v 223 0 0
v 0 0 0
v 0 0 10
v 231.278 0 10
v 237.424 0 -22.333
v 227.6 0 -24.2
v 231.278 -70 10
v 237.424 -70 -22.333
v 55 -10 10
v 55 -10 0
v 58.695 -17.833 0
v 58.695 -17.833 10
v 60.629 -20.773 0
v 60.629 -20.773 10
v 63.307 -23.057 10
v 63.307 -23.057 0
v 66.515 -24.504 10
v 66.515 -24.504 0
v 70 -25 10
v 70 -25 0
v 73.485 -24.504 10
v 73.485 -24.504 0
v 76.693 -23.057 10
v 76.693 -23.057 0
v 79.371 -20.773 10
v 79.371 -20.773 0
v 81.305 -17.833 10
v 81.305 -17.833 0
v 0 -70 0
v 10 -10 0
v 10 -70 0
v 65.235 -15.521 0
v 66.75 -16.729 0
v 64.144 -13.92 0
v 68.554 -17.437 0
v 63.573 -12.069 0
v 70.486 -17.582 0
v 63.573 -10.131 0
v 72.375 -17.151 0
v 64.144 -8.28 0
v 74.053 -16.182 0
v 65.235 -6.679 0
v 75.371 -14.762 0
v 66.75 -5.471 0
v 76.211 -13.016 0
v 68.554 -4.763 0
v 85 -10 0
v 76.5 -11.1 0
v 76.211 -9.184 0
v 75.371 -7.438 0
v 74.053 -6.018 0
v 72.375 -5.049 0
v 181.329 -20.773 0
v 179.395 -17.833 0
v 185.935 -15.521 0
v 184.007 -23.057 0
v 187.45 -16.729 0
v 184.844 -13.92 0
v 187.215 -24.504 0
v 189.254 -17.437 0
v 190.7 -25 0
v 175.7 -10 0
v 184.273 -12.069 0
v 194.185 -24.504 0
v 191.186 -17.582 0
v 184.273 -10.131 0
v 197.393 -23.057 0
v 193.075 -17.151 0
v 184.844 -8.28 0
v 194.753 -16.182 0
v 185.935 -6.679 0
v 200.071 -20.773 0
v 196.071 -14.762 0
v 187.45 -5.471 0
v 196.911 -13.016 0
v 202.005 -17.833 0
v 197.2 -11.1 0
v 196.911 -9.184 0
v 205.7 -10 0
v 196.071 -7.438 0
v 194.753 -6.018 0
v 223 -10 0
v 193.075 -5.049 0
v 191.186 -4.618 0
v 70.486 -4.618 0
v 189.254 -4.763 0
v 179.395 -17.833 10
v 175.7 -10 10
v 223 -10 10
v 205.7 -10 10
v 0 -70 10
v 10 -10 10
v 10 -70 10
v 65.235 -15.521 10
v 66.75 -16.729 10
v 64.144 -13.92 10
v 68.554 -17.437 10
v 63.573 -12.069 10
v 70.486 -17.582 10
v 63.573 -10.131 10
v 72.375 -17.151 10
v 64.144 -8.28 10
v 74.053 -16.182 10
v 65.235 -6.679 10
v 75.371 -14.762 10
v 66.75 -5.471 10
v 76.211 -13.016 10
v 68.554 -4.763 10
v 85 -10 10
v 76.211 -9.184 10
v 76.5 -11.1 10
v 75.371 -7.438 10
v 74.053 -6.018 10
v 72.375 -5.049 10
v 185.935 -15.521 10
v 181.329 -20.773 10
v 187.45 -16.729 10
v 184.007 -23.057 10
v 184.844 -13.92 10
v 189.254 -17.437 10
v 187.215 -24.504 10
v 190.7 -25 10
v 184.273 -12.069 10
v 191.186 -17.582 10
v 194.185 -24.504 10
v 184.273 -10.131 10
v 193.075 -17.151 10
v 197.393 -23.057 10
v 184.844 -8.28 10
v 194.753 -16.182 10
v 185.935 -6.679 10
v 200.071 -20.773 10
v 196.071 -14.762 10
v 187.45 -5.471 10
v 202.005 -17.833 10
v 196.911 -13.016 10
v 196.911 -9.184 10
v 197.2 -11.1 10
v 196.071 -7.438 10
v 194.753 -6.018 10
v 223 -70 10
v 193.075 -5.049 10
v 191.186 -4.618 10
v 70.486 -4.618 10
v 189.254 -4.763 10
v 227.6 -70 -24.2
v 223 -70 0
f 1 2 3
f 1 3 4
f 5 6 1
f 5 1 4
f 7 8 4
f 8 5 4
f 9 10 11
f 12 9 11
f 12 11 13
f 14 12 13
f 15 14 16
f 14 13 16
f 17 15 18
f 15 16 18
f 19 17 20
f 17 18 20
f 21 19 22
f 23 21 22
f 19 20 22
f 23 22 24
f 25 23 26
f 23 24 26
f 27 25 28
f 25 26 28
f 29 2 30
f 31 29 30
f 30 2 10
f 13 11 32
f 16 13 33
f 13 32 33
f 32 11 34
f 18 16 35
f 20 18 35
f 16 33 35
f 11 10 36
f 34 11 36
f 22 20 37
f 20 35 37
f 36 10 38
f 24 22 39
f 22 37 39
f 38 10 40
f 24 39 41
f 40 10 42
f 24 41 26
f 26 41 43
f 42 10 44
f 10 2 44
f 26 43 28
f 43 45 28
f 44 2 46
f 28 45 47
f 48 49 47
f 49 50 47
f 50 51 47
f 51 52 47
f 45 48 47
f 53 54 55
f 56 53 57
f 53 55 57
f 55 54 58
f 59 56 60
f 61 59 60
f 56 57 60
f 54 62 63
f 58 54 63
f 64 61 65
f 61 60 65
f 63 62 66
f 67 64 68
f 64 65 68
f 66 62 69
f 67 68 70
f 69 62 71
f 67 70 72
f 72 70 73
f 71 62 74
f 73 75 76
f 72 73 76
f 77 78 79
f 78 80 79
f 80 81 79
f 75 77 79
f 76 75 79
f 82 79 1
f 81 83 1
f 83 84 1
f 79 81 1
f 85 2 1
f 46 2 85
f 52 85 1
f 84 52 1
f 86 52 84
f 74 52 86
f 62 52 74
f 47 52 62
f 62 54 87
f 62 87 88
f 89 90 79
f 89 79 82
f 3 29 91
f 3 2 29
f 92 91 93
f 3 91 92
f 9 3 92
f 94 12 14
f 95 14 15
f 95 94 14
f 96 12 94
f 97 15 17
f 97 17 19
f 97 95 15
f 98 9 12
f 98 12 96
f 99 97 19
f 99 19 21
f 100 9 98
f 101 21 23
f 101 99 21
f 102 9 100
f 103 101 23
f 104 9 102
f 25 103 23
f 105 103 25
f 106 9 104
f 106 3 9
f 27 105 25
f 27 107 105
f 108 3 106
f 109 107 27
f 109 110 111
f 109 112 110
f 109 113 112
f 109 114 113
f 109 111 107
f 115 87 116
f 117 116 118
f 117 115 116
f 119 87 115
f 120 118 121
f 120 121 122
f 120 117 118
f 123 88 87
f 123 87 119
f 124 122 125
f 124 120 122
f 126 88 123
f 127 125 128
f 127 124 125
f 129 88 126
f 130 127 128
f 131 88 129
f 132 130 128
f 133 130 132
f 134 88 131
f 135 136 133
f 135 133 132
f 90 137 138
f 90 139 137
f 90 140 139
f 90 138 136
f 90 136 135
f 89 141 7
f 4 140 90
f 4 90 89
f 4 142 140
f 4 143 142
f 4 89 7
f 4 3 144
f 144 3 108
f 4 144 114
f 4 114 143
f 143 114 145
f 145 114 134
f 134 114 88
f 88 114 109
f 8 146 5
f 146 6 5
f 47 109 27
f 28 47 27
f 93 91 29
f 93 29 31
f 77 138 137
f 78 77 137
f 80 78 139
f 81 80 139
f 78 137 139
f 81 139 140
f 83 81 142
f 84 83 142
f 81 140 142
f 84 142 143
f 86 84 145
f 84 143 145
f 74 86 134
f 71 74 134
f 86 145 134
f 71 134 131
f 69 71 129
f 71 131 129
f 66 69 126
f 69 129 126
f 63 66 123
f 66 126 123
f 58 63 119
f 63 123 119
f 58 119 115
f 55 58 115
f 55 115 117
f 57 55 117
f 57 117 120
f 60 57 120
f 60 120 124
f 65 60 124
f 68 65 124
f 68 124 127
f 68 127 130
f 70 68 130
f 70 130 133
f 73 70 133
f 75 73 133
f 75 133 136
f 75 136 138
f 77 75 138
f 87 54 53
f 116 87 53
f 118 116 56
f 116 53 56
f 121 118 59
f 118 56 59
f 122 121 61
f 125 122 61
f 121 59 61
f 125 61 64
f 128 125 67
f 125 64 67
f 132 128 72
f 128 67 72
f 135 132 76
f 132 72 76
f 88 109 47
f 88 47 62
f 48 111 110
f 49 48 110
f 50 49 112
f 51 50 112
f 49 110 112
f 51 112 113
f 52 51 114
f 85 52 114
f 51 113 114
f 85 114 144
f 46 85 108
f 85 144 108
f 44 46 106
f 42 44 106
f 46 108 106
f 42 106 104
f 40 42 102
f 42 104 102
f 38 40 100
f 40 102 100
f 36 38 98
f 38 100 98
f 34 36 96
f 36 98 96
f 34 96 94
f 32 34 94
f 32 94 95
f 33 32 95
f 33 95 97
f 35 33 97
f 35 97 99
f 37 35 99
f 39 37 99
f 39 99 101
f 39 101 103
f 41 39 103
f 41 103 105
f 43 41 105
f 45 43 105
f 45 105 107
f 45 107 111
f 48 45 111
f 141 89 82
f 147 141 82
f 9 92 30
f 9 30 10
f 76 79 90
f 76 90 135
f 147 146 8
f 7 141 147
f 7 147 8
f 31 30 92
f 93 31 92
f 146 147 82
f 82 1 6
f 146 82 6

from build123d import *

# Parameters (mm, degrees)
PAD_DEPTH    = 10
PAD001_DEPTH = 60
SKETCH003_W  = 10
SKETCH003_H  = 10
PAD003_DEPTH = 60
PAD004_DEPTH = 10
SKETCH005_R  = 6.5
HOLE_DEPTH   = 34.201


with BuildPart() as part:
    # Sketch → Pad (new body)
    with BuildSketch(Plane.XZ):
        Polygon((0, 0), (223, 0), (227.6, -24.2), (237.424096, -22.33261), (231.278228, 10), (0, 10), align=None)
    extrude(amount=PAD_DEPTH)

    # Sketch001 → Pad001 (join)
    with BuildSketch(Plane.XZ.offset(10)):
        Polygon((223, 0), (227.6, -24.2), (237.424096, -22.33261), (231.278228, 10), (223, 10), align=None)
    extrude(amount=PAD001_DEPTH)

    # Sketch003 → Pad003 (join)
    with BuildSketch(Plane.XZ.offset(10)):
        with Locations((5, 5)):
            Rectangle(SKETCH003_W, SKETCH003_H)
    extrude(amount=PAD003_DEPTH)

    # Sketch004 → Pad004 (join)
    with BuildSketch(Plane.XY):
        with BuildLine():
            ThreePointArc((58.69456, -17.832638), (70, -25), (81.30544, -17.832638))
            Line((85, -10), (81.30544, -17.832638))
            Line((85, 0), (85, -10))
            Line((55, 0), (85, 0))
            Line((55, -10), (55, 0))
            Line((55, -10), (58.69456, -17.832638))
        make_face()
        with BuildLine():
            Line((179.39456, -17.832638), (175.7, -10))
            Line((175.7, -10), (175.7, 0))
            Line((175.7, 0), (205.7, 0))
            Line((205.7, 0), (205.7, -10))
            Line((205.7, -10), (202.00544, -17.832638))
            ThreePointArc((179.39456, -17.832638), (190.7, -25), (202.00544, -17.832638))
        make_face()
    extrude(amount=PAD004_DEPTH)

    # Sketch005 → Hole (cut, through all)
    with BuildSketch(Plane.XY.offset(10)):
        with Locations((70, -11.1)):
            Circle(SKETCH005_R)
        with Locations((190.7, -11.1)):
            Circle(SKETCH005_R)
    extrude(amount=-HOLE_DEPTH, mode=Mode.SUBTRACT)


solid = part.part
